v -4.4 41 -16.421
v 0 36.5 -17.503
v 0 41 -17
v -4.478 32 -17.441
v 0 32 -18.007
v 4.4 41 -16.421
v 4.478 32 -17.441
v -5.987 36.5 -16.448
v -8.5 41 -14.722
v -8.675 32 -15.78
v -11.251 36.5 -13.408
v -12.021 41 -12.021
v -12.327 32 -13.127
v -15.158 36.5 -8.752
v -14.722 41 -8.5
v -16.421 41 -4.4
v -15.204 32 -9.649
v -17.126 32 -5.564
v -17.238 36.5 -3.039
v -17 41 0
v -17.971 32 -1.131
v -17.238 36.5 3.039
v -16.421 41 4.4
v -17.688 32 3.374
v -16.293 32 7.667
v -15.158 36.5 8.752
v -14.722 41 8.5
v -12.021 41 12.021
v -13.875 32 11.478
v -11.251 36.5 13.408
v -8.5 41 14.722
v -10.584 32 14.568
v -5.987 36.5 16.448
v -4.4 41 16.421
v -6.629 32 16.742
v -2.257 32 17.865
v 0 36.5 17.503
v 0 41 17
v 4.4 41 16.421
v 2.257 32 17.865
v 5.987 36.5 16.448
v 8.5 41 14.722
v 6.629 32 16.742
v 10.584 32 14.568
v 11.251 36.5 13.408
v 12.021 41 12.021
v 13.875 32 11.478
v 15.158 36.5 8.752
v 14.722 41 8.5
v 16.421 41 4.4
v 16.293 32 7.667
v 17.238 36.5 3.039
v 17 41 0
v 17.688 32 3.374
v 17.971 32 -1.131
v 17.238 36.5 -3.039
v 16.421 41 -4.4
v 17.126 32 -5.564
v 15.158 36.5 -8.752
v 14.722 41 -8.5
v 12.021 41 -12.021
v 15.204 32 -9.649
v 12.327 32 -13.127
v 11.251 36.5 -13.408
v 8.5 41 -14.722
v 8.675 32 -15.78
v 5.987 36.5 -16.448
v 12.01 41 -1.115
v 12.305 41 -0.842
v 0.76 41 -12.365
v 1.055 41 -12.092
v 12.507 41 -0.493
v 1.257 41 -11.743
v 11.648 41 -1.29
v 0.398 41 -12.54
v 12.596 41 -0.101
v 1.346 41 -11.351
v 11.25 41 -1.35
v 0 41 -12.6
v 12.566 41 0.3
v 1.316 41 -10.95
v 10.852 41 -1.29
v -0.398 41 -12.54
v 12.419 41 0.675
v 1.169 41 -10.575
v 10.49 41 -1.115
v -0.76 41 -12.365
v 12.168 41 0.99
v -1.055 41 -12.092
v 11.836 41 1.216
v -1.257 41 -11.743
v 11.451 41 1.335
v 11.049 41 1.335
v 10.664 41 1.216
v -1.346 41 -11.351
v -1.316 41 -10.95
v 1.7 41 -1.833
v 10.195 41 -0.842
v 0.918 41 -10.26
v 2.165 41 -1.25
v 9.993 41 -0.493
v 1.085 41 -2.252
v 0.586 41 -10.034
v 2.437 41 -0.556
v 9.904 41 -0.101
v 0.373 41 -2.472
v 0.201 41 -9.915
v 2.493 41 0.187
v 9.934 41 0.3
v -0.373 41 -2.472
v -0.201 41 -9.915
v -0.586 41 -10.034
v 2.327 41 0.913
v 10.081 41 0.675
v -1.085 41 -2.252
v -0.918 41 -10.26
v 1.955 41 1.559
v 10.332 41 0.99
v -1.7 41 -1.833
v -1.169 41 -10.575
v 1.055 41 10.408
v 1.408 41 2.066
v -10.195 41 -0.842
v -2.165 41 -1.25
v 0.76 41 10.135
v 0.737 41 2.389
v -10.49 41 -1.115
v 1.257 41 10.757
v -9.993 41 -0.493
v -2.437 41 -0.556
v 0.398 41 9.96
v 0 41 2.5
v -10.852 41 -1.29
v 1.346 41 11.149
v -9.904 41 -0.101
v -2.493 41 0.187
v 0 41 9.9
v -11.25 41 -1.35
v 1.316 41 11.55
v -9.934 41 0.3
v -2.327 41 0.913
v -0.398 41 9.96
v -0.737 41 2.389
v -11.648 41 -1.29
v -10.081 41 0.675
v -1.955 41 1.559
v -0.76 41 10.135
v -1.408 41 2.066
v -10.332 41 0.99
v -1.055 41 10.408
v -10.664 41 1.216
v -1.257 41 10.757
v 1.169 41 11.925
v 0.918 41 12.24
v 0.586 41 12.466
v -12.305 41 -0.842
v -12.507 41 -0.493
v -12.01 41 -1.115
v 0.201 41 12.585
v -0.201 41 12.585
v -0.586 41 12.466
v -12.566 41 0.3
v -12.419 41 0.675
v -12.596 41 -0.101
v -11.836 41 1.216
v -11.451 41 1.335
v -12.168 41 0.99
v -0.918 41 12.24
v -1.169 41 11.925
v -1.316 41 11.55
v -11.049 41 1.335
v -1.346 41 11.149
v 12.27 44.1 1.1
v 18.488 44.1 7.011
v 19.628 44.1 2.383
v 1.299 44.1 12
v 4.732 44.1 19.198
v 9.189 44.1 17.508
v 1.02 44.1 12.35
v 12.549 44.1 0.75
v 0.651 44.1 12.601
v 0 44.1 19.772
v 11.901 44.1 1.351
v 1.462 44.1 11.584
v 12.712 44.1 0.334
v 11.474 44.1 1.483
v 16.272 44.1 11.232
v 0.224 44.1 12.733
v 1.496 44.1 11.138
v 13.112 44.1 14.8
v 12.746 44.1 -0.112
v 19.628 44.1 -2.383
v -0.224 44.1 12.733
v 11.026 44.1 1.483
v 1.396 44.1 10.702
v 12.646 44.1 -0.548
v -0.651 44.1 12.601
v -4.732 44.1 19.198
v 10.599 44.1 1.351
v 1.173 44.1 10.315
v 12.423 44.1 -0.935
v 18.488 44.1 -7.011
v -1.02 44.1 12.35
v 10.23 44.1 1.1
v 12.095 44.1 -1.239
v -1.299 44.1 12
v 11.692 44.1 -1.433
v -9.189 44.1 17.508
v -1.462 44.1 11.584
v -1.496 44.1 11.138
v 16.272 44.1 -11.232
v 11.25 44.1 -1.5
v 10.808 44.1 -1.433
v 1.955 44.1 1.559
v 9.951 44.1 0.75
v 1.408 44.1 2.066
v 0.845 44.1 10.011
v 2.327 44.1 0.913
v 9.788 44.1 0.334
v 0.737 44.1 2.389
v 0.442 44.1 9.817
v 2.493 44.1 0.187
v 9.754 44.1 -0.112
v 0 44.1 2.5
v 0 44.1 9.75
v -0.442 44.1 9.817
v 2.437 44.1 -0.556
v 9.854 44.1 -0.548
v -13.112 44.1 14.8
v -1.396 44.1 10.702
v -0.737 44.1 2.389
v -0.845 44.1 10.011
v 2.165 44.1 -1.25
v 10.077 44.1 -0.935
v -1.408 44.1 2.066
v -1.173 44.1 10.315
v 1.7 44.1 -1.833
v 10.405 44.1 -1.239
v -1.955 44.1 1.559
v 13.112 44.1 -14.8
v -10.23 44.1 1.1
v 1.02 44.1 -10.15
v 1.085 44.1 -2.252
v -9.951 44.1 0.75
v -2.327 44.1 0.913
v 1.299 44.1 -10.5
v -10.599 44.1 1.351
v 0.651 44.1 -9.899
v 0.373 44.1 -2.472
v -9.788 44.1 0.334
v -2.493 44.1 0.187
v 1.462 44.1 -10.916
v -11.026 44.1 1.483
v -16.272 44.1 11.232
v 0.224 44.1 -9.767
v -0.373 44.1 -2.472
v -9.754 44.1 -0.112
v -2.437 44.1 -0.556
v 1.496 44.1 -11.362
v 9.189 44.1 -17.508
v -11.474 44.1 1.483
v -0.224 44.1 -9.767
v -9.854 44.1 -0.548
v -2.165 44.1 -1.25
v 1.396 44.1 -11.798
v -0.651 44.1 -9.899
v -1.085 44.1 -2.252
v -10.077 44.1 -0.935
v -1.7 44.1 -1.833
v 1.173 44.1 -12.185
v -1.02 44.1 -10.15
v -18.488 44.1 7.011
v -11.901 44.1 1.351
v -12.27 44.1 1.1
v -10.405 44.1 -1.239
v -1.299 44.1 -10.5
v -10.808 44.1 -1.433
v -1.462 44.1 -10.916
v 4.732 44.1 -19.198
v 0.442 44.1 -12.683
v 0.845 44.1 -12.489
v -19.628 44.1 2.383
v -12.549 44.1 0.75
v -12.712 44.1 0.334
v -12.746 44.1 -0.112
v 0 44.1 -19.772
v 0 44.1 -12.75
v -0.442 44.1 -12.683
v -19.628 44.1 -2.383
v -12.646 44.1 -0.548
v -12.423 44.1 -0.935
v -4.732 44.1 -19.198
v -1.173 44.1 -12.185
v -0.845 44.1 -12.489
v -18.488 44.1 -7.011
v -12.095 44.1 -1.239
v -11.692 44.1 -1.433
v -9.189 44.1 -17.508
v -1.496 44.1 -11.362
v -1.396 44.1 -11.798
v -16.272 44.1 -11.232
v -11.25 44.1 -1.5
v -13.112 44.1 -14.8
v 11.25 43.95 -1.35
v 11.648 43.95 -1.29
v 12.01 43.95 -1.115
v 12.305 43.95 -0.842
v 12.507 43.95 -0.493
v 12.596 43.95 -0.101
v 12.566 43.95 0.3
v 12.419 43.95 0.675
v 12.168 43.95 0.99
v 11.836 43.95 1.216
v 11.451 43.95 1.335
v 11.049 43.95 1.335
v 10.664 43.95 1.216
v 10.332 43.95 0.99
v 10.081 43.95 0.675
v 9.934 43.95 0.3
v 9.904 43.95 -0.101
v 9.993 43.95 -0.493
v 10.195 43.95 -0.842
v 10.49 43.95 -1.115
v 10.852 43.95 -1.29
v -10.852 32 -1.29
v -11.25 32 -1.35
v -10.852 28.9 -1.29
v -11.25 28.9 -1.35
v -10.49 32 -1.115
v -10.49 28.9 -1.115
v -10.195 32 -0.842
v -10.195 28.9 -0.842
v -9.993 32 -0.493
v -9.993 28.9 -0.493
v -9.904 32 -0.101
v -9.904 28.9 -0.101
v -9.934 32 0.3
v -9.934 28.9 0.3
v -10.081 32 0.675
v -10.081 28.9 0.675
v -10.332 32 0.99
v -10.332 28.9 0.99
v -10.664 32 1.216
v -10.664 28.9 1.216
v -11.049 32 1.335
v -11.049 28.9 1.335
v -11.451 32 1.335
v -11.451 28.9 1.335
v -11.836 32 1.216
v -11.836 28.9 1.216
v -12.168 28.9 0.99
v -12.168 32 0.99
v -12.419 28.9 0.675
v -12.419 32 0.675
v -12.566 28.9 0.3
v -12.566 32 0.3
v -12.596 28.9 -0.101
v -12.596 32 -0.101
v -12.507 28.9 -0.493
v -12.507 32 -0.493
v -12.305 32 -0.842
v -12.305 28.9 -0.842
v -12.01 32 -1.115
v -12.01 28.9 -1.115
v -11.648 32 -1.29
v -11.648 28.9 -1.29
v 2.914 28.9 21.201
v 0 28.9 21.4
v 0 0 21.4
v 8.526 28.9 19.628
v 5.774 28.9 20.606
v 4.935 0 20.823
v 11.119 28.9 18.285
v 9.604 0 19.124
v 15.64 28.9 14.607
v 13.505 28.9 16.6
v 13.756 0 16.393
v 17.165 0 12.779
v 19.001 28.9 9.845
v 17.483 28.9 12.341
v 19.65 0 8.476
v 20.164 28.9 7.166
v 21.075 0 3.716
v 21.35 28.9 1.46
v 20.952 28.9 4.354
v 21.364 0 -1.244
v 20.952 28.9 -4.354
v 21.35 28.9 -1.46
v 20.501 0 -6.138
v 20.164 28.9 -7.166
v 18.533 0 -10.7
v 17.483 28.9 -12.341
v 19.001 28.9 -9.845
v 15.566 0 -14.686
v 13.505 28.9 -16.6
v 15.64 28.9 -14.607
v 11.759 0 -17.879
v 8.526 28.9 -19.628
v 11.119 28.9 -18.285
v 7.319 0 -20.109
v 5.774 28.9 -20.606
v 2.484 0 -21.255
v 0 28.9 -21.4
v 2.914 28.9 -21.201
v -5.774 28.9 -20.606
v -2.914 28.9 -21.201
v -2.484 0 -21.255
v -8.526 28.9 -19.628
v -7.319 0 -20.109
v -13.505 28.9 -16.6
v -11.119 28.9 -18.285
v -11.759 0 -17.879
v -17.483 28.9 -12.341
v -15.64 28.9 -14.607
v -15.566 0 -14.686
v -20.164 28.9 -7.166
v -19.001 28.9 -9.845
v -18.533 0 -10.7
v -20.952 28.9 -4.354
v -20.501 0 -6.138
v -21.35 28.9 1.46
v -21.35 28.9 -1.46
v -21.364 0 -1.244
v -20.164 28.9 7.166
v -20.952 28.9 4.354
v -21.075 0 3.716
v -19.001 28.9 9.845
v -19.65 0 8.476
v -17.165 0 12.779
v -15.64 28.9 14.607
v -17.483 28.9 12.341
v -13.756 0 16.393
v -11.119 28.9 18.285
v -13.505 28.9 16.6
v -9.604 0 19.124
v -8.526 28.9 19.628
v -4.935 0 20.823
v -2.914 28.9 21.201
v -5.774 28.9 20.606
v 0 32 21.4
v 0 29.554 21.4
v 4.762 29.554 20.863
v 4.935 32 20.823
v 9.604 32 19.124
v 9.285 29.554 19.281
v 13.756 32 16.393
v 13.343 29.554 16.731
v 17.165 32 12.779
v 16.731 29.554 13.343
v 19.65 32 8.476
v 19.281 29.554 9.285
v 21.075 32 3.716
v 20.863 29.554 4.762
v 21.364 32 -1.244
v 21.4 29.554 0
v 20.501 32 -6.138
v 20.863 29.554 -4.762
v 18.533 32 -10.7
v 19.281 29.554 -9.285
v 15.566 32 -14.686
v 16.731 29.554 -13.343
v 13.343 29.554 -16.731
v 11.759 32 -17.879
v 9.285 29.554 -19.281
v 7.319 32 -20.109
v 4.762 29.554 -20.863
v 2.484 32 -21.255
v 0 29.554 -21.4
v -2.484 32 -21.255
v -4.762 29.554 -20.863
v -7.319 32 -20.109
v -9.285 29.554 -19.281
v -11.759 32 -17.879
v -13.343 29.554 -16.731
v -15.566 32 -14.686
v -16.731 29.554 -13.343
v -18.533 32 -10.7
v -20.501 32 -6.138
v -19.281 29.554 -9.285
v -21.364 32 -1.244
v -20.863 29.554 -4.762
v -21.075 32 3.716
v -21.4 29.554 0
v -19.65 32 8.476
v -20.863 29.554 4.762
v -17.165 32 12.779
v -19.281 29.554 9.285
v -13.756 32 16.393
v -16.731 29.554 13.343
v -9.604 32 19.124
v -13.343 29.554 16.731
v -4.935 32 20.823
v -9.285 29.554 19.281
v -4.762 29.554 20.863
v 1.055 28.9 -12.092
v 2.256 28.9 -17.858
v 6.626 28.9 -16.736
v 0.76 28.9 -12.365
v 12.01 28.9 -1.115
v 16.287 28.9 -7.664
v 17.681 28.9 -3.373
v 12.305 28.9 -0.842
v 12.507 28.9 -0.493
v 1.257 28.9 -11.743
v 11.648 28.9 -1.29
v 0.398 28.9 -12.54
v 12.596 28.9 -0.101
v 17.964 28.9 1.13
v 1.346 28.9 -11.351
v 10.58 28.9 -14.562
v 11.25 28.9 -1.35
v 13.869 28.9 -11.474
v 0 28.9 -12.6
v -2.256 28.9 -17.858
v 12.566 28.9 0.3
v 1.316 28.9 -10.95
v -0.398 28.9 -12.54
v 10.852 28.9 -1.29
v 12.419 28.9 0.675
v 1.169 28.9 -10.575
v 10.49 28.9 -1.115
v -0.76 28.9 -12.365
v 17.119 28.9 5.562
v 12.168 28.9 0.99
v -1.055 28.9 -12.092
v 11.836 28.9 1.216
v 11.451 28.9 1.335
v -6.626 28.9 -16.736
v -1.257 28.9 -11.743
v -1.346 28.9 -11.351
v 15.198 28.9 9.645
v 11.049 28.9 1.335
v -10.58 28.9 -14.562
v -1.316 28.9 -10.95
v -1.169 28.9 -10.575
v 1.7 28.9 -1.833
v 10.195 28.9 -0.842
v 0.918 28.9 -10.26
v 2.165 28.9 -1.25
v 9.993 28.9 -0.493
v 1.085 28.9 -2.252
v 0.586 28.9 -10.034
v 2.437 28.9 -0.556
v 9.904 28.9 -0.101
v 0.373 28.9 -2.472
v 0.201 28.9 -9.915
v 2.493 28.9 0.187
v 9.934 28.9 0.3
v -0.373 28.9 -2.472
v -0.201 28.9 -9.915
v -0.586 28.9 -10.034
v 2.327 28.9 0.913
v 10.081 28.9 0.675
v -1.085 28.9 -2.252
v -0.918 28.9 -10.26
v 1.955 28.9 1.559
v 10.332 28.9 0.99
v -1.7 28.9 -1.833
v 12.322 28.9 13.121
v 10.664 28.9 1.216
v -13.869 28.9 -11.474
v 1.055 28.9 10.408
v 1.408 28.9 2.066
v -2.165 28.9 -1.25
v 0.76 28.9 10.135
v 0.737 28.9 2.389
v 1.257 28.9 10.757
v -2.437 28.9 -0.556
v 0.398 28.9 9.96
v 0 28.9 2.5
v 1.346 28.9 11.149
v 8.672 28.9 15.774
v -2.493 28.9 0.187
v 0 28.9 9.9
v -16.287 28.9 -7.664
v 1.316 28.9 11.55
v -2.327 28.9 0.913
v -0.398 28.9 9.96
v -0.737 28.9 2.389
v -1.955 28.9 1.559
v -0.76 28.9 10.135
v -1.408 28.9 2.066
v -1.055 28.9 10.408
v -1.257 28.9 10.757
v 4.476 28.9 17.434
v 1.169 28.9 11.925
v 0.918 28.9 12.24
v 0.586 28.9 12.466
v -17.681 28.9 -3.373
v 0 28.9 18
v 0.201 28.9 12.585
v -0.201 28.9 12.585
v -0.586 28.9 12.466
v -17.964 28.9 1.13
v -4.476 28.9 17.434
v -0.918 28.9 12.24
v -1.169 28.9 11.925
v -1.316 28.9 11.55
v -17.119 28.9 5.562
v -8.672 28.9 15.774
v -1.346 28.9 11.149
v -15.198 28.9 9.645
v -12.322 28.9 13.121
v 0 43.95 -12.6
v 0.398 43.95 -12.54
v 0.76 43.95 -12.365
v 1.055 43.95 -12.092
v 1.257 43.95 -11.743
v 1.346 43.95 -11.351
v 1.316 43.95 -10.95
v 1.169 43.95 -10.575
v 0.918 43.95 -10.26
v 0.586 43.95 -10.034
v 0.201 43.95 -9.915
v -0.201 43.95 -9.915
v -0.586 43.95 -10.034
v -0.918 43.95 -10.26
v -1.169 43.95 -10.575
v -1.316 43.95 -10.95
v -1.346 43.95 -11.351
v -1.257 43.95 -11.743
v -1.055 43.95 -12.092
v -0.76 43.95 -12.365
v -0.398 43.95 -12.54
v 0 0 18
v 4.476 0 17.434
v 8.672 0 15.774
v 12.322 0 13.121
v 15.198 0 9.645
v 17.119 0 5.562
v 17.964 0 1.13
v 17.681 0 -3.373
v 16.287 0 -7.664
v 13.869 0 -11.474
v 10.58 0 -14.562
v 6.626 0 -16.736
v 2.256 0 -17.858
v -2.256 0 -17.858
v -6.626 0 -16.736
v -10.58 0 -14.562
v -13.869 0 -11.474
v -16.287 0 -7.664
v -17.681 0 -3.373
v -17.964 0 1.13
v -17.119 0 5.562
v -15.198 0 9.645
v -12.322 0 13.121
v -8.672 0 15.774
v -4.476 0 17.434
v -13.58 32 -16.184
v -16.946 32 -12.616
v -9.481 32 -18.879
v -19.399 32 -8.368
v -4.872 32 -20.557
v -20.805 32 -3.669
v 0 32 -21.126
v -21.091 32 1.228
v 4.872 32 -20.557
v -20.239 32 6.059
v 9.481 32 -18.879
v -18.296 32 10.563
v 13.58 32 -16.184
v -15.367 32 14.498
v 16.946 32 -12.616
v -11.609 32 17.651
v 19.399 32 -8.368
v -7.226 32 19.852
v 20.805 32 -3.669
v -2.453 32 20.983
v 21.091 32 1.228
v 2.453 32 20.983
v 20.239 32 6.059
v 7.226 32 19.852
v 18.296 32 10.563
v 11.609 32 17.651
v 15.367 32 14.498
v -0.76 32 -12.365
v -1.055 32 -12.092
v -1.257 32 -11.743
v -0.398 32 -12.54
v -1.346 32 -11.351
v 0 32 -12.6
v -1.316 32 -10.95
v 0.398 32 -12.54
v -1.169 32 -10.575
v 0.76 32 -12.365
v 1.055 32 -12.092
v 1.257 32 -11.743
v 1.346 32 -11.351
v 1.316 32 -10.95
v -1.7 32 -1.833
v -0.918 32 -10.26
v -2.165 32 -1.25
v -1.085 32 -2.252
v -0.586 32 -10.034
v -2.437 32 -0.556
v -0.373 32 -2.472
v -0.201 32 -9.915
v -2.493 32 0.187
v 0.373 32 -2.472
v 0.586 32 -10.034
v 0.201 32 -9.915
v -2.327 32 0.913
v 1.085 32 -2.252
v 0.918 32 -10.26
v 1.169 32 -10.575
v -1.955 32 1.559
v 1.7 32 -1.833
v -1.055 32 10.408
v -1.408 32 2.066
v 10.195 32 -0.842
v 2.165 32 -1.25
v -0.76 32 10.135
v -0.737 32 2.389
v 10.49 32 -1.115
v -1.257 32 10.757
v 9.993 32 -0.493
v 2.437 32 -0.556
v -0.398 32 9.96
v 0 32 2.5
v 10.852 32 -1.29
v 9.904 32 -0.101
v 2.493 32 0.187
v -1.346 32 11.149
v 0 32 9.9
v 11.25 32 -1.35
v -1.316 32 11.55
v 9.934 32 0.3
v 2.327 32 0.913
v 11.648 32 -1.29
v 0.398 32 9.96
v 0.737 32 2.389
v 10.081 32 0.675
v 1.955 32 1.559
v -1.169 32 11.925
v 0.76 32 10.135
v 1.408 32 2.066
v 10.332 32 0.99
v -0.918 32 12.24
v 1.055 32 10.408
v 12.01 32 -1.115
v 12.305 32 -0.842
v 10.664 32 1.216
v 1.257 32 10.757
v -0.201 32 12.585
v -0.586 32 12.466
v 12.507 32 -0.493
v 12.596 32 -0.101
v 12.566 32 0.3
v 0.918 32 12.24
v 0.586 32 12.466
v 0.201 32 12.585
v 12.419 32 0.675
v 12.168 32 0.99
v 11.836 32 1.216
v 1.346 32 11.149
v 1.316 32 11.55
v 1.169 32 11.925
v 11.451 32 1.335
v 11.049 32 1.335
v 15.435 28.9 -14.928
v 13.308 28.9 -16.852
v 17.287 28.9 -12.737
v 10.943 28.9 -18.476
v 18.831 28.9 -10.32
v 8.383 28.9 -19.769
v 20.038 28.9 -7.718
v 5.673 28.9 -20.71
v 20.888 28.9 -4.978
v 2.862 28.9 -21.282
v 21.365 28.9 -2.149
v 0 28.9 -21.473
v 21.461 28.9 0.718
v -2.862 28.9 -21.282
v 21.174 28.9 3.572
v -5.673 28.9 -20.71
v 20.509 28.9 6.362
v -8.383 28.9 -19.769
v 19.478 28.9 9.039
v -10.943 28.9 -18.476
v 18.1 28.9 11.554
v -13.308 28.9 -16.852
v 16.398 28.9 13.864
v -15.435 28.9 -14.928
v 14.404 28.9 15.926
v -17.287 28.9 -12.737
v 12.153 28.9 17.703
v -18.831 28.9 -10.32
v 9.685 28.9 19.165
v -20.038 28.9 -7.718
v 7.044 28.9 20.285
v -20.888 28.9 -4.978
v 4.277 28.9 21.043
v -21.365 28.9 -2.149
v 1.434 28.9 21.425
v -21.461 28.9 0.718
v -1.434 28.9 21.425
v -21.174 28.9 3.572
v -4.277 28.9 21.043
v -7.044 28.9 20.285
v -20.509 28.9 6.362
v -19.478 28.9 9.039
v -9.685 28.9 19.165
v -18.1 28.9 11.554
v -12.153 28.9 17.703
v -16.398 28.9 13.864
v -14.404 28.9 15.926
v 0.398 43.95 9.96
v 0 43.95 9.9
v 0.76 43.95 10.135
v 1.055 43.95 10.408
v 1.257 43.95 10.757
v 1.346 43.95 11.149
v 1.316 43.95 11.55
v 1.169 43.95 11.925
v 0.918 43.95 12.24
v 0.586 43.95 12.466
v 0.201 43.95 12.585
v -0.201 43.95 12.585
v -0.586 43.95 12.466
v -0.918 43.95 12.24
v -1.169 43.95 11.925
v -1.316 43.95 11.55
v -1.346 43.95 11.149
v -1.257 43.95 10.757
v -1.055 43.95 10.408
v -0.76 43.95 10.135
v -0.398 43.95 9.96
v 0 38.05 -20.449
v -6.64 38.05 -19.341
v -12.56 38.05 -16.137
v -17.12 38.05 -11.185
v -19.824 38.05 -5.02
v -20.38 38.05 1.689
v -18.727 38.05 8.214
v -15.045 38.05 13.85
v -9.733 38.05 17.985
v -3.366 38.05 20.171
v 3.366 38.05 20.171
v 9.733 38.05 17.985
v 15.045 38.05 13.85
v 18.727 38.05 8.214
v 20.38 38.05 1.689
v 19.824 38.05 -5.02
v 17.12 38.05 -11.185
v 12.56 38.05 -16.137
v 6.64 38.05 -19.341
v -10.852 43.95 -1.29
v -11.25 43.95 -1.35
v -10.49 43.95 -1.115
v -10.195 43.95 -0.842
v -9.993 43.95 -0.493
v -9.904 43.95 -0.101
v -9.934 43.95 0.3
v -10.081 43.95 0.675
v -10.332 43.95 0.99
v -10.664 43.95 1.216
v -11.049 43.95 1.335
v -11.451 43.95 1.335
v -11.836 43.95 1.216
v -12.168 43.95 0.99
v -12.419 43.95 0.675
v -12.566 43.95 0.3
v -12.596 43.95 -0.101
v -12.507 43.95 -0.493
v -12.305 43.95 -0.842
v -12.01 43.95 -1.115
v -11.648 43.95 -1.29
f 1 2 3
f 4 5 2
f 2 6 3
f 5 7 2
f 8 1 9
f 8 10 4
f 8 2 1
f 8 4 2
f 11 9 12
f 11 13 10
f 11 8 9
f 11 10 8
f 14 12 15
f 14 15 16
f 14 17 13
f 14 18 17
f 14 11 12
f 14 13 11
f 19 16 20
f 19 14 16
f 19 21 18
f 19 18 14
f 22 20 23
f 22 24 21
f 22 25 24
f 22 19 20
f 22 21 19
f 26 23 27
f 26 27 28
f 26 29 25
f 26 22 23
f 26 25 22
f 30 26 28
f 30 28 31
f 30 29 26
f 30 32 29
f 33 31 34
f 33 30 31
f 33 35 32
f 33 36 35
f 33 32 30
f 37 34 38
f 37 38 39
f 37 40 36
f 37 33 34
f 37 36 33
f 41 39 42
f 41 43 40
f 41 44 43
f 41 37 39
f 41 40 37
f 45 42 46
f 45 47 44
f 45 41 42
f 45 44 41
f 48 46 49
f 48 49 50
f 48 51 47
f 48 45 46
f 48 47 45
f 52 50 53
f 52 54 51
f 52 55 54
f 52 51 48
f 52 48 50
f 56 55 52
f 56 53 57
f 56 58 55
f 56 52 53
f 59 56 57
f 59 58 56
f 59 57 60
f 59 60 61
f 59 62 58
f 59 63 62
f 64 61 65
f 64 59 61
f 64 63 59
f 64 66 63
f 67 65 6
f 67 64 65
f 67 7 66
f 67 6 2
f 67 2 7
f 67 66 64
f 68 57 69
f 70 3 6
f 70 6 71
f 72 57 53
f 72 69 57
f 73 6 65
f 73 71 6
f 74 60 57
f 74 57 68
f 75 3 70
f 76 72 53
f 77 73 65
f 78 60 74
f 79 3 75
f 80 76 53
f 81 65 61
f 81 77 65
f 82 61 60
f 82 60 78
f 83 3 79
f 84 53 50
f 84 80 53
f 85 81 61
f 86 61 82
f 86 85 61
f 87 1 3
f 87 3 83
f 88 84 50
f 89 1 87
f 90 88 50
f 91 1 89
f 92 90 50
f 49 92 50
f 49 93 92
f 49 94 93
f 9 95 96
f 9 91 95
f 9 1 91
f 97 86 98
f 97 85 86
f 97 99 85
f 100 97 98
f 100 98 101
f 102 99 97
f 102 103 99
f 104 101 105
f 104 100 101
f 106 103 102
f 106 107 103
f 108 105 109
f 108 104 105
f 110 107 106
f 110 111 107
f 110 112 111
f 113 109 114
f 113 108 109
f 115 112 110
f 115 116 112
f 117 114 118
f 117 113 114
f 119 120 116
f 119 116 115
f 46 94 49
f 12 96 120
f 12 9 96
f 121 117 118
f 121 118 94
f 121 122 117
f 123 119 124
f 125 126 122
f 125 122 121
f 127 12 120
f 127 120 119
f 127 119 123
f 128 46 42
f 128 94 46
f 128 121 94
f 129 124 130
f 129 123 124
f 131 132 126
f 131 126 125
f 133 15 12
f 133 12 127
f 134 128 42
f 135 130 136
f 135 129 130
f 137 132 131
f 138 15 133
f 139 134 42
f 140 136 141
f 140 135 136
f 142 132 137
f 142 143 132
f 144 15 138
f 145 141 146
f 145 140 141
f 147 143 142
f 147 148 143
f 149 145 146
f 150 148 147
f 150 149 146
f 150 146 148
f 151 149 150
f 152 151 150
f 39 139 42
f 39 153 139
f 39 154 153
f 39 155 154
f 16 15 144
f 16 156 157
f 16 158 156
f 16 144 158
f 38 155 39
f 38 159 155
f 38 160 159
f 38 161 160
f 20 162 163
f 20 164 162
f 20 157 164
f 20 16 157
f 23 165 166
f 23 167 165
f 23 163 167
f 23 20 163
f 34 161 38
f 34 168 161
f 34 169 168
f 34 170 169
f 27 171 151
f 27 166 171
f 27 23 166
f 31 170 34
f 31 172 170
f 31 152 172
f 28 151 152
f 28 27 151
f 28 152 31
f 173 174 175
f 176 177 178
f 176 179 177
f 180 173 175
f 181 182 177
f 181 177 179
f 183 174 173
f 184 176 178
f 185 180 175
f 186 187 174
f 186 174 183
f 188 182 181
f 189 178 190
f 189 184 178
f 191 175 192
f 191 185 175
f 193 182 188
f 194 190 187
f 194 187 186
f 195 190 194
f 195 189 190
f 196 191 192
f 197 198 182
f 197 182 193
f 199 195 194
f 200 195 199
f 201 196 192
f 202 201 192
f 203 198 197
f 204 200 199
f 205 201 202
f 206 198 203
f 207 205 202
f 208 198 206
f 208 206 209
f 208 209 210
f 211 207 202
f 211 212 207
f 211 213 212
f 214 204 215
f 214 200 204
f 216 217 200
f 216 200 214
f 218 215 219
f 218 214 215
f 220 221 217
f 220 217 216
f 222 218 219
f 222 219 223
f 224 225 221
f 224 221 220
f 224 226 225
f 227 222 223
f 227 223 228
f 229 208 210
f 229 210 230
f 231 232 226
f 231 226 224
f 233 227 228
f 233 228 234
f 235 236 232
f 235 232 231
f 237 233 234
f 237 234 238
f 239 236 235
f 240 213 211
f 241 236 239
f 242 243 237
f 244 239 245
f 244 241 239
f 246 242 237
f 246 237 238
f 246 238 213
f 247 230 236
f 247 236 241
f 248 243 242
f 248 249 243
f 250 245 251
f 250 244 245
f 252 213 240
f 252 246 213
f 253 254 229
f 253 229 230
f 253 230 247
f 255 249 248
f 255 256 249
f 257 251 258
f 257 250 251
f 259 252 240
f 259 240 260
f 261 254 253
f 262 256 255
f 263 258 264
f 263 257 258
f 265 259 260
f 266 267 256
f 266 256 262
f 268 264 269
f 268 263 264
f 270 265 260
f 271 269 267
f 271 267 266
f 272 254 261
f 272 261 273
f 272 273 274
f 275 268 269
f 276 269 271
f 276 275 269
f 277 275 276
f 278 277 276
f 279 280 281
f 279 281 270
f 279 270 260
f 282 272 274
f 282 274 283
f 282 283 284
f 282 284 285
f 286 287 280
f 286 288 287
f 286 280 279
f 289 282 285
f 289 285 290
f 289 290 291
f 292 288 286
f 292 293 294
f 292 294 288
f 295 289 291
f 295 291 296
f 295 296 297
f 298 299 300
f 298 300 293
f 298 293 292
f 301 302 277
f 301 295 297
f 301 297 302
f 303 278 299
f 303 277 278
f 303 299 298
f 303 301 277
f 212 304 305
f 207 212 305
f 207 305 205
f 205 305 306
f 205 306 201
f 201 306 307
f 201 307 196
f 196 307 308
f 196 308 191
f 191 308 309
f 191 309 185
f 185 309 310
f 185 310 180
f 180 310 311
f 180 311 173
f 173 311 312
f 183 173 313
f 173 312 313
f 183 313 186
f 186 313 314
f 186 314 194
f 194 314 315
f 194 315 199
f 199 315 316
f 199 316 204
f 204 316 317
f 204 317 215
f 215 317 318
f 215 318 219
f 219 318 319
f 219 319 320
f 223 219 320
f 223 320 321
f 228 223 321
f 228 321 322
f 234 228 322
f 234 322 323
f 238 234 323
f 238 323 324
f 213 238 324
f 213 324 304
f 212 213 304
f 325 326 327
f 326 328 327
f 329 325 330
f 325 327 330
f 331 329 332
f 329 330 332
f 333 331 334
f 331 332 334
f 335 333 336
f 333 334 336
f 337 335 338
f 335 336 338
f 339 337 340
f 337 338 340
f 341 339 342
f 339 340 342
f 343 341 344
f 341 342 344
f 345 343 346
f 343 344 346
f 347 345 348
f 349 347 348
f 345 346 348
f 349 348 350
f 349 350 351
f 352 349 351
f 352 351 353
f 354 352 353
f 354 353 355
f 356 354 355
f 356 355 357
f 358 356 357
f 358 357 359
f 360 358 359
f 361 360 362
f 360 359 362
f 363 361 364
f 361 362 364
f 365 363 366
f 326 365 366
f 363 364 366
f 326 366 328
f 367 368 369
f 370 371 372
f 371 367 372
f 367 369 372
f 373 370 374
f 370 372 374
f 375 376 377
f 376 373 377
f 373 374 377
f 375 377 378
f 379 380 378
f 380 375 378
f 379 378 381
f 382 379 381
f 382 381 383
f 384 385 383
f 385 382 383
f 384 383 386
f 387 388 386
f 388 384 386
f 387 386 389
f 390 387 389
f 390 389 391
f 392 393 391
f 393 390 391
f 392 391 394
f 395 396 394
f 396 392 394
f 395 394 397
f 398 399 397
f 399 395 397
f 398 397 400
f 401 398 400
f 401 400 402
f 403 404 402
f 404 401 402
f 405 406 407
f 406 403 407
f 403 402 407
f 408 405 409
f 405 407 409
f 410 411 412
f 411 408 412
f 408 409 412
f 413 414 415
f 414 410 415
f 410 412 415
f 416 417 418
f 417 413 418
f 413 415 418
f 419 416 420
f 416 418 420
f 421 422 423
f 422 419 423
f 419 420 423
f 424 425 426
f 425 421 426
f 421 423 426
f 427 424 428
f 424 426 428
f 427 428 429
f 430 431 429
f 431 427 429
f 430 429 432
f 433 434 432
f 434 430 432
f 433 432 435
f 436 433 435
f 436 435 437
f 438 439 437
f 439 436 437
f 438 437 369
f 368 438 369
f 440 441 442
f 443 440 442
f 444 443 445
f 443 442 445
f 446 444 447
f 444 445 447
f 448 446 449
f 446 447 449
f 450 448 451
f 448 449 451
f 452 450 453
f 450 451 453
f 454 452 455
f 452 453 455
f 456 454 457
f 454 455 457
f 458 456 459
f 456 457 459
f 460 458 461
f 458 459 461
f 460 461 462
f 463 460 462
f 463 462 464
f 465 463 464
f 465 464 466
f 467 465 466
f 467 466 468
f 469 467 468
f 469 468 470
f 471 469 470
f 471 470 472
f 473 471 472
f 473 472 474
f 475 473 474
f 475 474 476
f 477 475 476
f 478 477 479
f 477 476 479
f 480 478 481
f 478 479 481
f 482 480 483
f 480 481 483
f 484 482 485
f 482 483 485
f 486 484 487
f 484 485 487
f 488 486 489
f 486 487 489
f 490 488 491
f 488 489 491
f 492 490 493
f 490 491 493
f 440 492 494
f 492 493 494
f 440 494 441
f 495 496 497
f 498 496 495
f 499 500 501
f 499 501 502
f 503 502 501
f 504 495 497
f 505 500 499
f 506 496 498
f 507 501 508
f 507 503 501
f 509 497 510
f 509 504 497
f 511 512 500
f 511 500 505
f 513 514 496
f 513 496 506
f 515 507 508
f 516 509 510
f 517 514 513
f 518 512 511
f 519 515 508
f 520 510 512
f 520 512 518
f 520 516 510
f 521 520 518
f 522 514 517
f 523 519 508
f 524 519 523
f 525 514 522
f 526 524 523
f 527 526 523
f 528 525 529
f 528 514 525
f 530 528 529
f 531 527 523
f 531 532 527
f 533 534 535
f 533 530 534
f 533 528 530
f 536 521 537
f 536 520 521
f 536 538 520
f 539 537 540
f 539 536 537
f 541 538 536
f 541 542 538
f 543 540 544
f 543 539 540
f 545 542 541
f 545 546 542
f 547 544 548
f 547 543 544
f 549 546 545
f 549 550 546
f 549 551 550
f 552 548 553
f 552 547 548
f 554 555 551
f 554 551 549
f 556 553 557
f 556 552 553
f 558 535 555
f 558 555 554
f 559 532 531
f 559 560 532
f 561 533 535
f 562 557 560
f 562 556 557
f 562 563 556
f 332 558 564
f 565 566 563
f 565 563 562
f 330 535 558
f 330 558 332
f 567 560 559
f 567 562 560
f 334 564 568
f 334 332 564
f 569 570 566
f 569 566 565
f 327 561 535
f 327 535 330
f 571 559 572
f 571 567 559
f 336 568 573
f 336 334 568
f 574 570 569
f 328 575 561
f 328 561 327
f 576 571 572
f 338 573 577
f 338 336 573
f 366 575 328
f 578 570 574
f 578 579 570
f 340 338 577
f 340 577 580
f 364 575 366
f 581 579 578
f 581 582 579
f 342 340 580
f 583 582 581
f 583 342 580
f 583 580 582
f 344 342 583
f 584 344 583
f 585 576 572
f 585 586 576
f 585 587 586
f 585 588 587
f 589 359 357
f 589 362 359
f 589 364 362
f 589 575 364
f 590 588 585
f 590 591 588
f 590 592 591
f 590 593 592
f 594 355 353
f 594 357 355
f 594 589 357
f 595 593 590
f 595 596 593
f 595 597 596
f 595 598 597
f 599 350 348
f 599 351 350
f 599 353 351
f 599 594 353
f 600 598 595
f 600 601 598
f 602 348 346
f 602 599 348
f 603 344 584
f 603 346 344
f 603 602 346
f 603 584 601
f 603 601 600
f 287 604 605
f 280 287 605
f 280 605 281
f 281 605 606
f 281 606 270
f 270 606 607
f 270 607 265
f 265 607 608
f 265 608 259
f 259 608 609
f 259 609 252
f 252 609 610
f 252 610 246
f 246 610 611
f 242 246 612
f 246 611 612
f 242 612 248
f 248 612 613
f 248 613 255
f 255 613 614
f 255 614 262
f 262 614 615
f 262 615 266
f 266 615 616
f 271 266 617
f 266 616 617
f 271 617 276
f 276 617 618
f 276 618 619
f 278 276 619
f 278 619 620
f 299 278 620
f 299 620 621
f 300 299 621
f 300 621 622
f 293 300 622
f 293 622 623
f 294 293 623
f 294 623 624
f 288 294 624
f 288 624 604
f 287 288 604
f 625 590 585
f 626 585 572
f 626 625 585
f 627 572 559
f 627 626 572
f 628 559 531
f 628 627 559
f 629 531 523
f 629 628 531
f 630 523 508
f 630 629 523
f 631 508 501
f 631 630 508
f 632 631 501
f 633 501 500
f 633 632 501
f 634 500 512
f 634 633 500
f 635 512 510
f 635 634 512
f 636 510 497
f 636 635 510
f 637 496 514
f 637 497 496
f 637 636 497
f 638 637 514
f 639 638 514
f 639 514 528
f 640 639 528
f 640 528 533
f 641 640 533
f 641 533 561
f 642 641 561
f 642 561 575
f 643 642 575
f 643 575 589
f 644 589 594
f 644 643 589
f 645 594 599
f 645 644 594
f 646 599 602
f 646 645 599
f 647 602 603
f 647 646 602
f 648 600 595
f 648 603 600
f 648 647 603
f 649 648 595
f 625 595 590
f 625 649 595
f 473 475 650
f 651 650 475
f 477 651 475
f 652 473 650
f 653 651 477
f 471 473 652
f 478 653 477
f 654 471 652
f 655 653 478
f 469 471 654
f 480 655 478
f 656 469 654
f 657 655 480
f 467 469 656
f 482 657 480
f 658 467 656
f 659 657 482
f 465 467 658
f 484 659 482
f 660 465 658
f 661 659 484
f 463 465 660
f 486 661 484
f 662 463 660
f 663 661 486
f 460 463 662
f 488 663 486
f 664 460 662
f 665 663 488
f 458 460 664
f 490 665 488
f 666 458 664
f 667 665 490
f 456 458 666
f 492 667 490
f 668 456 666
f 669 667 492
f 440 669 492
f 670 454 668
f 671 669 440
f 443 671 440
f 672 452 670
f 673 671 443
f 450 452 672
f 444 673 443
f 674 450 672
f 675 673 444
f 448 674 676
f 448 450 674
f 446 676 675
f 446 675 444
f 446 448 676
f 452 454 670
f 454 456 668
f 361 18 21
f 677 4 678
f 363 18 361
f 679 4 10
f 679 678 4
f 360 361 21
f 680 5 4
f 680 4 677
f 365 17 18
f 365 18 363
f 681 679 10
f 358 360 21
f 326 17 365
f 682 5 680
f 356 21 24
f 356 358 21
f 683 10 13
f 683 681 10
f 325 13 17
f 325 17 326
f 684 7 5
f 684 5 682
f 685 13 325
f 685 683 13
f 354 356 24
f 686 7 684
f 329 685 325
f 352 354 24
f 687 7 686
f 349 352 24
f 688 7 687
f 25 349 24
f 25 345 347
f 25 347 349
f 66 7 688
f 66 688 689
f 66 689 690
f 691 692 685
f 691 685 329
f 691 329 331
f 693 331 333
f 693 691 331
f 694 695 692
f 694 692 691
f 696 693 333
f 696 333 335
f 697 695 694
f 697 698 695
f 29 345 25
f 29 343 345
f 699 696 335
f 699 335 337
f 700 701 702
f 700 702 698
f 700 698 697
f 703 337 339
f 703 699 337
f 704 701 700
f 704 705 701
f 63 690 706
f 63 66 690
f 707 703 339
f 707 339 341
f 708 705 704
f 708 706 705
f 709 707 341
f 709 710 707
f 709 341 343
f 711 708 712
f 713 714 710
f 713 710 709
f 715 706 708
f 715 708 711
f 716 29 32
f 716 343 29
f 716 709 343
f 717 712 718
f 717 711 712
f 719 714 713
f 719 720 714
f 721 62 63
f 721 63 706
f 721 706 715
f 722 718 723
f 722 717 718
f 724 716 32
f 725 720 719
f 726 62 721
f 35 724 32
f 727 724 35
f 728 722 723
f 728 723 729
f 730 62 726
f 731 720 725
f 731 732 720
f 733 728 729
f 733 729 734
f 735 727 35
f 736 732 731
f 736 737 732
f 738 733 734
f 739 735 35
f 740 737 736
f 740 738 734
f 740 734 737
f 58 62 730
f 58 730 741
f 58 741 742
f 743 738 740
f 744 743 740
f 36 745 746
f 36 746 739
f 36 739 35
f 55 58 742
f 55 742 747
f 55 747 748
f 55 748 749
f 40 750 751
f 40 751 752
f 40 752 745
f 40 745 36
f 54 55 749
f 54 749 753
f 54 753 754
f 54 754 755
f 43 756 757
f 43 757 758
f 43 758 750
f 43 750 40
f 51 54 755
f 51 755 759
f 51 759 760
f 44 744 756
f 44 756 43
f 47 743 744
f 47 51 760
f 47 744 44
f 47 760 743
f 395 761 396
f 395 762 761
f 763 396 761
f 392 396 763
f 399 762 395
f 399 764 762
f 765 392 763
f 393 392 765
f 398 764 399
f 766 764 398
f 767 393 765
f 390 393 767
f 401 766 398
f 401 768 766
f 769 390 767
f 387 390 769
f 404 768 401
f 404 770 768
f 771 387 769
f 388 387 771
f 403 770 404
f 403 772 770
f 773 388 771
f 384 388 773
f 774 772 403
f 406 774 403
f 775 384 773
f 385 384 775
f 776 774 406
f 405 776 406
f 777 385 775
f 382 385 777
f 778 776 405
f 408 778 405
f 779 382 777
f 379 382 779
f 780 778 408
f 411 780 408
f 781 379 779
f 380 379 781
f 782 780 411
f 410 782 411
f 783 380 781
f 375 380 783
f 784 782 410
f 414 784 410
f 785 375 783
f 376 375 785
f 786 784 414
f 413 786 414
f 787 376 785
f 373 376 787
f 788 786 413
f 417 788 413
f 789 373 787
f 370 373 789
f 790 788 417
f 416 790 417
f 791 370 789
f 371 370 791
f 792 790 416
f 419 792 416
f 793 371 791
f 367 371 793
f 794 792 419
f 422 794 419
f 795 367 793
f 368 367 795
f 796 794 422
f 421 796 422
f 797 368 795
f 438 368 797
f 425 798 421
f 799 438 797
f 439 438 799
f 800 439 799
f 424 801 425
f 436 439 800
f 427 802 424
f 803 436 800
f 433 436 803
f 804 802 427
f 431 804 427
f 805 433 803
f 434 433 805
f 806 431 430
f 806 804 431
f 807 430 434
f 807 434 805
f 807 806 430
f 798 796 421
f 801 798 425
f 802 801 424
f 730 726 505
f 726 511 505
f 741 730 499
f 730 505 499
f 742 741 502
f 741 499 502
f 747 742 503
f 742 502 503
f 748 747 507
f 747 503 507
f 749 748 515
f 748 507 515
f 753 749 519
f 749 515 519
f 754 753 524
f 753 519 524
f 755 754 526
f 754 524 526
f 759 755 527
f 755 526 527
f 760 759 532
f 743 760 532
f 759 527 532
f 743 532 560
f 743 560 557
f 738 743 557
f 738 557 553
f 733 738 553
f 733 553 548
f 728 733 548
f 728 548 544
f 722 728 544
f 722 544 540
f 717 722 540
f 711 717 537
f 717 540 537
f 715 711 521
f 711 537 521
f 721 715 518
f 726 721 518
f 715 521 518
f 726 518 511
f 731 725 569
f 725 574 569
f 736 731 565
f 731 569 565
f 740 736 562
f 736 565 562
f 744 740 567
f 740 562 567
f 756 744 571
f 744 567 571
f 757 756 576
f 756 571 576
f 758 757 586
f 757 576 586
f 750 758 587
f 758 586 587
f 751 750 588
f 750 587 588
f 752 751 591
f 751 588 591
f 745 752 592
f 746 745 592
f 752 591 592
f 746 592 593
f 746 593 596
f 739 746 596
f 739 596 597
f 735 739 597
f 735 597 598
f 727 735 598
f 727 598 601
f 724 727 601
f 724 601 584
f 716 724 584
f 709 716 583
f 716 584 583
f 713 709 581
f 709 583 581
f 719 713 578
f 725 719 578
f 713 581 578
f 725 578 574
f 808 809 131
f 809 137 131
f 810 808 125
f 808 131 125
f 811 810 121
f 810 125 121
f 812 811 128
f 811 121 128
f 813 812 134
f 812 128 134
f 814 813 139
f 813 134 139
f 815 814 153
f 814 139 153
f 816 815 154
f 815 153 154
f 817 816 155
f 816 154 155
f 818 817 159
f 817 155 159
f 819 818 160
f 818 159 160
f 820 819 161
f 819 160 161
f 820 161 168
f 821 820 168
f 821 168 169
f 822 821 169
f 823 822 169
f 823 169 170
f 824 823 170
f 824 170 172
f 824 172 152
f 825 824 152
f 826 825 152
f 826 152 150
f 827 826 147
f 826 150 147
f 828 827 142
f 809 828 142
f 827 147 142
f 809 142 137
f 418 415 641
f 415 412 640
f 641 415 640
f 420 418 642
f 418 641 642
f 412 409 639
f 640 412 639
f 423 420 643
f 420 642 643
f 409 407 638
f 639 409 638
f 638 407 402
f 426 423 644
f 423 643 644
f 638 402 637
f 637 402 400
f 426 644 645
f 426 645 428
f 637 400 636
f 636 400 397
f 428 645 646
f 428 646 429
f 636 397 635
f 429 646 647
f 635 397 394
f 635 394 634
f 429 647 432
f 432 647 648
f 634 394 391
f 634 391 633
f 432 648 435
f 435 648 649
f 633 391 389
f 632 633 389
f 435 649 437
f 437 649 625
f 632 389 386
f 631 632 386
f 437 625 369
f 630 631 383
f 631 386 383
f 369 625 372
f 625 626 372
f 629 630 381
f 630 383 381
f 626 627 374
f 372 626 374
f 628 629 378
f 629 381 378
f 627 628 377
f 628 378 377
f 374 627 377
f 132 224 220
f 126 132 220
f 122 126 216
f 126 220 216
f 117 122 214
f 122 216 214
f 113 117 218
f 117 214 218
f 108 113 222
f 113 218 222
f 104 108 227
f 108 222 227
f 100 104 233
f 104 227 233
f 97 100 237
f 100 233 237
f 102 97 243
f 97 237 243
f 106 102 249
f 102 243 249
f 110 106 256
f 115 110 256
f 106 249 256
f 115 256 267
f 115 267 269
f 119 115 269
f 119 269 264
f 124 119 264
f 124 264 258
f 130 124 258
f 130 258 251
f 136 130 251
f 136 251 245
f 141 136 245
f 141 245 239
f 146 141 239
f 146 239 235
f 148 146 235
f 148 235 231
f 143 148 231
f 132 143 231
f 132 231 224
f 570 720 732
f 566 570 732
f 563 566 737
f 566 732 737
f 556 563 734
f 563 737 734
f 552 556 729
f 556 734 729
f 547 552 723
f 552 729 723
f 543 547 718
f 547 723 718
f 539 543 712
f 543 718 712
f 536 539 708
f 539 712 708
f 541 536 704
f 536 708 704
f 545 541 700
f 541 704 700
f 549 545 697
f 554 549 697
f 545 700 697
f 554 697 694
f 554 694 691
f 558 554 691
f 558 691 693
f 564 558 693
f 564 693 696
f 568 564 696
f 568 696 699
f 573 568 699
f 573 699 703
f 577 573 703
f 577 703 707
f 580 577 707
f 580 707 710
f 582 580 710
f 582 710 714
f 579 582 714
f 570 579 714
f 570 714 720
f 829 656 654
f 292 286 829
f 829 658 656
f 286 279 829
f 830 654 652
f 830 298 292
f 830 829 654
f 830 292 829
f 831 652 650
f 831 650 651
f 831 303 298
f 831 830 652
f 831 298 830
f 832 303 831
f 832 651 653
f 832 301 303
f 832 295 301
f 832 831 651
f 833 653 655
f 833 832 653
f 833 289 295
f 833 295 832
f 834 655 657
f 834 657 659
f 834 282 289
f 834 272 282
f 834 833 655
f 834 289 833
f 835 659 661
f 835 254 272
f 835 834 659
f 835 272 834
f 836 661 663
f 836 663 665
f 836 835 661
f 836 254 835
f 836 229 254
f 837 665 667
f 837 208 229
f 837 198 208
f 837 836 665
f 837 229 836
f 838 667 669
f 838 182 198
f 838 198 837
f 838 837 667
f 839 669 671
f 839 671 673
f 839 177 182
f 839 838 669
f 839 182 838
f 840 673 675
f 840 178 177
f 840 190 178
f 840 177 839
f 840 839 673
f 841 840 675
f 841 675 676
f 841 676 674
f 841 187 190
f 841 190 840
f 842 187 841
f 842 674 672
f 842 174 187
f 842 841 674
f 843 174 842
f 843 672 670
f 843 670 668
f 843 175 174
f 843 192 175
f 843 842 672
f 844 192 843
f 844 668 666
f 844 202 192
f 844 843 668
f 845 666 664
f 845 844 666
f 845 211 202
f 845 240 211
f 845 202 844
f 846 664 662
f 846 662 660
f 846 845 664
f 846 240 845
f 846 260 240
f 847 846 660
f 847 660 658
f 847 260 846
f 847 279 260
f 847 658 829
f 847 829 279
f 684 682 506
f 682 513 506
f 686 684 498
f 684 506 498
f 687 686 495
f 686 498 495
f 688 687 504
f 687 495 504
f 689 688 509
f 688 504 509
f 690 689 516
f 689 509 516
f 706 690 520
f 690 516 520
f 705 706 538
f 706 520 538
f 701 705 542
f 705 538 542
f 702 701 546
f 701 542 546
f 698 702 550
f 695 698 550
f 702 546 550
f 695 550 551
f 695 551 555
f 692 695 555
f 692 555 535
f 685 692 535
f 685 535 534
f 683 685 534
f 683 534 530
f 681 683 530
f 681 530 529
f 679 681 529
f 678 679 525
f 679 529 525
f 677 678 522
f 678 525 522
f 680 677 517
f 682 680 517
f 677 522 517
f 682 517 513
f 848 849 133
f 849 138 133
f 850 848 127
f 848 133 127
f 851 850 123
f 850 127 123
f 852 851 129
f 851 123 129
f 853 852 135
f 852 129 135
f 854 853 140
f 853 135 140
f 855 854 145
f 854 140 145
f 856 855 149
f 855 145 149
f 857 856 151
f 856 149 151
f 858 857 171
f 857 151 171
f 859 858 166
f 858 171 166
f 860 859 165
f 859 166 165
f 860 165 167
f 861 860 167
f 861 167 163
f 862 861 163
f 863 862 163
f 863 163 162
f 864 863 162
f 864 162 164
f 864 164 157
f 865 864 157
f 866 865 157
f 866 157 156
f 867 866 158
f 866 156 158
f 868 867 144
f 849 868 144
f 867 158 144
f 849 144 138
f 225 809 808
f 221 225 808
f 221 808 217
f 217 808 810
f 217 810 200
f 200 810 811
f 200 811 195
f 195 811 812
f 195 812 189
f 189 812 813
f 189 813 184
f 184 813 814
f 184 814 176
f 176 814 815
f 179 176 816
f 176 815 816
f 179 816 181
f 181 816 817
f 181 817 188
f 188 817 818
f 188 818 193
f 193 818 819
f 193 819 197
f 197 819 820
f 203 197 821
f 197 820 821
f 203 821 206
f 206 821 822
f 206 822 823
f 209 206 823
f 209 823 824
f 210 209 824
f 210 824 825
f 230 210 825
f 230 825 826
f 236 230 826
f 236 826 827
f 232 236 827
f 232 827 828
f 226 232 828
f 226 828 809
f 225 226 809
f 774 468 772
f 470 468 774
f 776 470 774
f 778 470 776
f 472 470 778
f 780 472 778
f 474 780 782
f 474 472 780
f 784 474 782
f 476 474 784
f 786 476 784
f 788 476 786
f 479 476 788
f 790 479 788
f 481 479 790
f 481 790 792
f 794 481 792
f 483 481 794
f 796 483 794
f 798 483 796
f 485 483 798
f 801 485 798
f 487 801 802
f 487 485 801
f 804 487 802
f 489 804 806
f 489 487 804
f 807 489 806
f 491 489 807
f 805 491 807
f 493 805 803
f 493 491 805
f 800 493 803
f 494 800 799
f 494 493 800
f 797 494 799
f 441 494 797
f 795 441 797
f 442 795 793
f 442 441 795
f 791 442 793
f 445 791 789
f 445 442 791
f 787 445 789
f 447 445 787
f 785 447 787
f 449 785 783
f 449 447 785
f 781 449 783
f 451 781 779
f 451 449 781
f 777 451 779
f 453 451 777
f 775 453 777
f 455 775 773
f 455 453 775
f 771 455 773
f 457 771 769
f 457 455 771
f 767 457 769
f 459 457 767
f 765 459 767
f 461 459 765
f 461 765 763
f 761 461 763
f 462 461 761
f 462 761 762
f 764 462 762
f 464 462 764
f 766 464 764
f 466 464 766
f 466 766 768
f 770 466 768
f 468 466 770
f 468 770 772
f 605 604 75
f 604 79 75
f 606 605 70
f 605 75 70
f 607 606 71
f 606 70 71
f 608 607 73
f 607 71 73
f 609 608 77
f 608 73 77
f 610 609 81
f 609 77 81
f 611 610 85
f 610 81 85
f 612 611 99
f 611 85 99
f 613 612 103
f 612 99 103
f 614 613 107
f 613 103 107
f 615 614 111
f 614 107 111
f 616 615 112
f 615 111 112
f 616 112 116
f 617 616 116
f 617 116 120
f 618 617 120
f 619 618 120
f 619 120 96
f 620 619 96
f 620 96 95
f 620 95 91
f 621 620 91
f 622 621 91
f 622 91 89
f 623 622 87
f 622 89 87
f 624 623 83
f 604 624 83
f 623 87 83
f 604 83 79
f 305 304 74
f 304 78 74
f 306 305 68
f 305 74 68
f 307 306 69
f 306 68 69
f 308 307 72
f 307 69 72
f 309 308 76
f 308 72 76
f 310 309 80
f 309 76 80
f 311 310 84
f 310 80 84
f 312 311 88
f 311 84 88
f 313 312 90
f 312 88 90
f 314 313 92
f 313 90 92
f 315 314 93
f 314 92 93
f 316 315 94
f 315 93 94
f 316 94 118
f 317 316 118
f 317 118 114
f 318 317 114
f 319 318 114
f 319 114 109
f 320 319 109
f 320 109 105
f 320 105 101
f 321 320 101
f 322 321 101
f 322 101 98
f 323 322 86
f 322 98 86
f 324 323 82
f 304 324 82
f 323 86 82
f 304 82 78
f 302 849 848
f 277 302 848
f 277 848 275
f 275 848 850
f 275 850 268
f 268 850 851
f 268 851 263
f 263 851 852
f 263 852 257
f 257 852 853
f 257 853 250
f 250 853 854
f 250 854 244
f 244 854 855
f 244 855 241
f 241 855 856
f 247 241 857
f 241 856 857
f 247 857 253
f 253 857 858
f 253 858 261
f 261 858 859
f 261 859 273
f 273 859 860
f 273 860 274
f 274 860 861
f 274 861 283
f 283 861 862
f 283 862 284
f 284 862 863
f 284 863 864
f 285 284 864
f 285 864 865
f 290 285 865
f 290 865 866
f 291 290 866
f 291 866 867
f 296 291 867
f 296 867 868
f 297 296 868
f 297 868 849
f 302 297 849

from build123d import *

# Parameters (mm, degrees)
SKETCH_1_R                = 21.4
SKETCH_1_R_2              = 18
EXTRUDE_1_DEPTH           = 32
SKETCH_13_R               = 2.5
CUT_EXTRUDE_1_DEPTH       = 54.544415829
HOLE_WIZARD_1_D           = 2.7
HOLE_WIZARD_1_CSINK_D     = 3
HOLE_WIZARD_1_CSINK_ANGLE = 90


with BuildPart() as part:
    # 草图1 → 凸台-拉伸1 (new body)
    with BuildSketch(Plane(origin=(0, 0, 0), x_dir=(1, 0, 0), z_dir=(0, 1, 0))):
        with Locations(Location((0, 0, 0), (0, 0, 270))):
            Circle(SKETCH_1_R)
        with Locations(Location((0, 0, 0), (0, 0, 270))):
            Circle(SKETCH_1_R_2, mode=Mode.SUBTRACT)
    extrude(amount=EXTRUDE_1_DEPTH)

    # 草图11 → 旋转-薄壁4 (revolve)
    with BuildSketch(Plane(origin=(0, 0, 0), x_dir=(0, 0, -1), z_dir=(1, 0, 0)), mode=Mode.PRIVATE) as revolve_4_sk:
        Polygon((0, 41), (-17, 41), (-18.006981843, 32), (0, 32), (0, 28.9), (-21.473174735, 28.9), (-19.772494289, 44.1), (0, 44.1), align=None)
    revolve(revolve_4_sk.sketch.rotate(Axis((0, 0, 0), (0, 1, 0)), 180), axis=Axis((0, 0, 0), (0, 1, 0)))

    # 草图13 → 切除-拉伸1 (cut, through all)
    with BuildSketch(Plane(origin=(0, 44.1, 0), x_dir=(1, 0, 0), z_dir=(0, 1, 0))):
        with Locations(Location((0, 0, 0), (0, 0, 270))):
            Circle(SKETCH_13_R)
    extrude(amount=-CUT_EXTRUDE_1_DEPTH, mode=Mode.SUBTRACT)

    # 打孔尺寸(%根据)内六角花形半沉头螺钉的类型1 (through all)
    with Locations(Plane(origin=(0, 44.1, -11.25), x_dir=(0, 0, 1), z_dir=(0, 1, 0))):
        with Locations((0, 0), (11.25, 11.25), (22.5, 0), (11.25, -11.25)):
            CounterSinkHole(HOLE_WIZARD_1_D / 2, HOLE_WIZARD_1_CSINK_D / 2, counter_sink_angle=HOLE_WIZARD_1_CSINK_ANGLE)


solid = part.part
